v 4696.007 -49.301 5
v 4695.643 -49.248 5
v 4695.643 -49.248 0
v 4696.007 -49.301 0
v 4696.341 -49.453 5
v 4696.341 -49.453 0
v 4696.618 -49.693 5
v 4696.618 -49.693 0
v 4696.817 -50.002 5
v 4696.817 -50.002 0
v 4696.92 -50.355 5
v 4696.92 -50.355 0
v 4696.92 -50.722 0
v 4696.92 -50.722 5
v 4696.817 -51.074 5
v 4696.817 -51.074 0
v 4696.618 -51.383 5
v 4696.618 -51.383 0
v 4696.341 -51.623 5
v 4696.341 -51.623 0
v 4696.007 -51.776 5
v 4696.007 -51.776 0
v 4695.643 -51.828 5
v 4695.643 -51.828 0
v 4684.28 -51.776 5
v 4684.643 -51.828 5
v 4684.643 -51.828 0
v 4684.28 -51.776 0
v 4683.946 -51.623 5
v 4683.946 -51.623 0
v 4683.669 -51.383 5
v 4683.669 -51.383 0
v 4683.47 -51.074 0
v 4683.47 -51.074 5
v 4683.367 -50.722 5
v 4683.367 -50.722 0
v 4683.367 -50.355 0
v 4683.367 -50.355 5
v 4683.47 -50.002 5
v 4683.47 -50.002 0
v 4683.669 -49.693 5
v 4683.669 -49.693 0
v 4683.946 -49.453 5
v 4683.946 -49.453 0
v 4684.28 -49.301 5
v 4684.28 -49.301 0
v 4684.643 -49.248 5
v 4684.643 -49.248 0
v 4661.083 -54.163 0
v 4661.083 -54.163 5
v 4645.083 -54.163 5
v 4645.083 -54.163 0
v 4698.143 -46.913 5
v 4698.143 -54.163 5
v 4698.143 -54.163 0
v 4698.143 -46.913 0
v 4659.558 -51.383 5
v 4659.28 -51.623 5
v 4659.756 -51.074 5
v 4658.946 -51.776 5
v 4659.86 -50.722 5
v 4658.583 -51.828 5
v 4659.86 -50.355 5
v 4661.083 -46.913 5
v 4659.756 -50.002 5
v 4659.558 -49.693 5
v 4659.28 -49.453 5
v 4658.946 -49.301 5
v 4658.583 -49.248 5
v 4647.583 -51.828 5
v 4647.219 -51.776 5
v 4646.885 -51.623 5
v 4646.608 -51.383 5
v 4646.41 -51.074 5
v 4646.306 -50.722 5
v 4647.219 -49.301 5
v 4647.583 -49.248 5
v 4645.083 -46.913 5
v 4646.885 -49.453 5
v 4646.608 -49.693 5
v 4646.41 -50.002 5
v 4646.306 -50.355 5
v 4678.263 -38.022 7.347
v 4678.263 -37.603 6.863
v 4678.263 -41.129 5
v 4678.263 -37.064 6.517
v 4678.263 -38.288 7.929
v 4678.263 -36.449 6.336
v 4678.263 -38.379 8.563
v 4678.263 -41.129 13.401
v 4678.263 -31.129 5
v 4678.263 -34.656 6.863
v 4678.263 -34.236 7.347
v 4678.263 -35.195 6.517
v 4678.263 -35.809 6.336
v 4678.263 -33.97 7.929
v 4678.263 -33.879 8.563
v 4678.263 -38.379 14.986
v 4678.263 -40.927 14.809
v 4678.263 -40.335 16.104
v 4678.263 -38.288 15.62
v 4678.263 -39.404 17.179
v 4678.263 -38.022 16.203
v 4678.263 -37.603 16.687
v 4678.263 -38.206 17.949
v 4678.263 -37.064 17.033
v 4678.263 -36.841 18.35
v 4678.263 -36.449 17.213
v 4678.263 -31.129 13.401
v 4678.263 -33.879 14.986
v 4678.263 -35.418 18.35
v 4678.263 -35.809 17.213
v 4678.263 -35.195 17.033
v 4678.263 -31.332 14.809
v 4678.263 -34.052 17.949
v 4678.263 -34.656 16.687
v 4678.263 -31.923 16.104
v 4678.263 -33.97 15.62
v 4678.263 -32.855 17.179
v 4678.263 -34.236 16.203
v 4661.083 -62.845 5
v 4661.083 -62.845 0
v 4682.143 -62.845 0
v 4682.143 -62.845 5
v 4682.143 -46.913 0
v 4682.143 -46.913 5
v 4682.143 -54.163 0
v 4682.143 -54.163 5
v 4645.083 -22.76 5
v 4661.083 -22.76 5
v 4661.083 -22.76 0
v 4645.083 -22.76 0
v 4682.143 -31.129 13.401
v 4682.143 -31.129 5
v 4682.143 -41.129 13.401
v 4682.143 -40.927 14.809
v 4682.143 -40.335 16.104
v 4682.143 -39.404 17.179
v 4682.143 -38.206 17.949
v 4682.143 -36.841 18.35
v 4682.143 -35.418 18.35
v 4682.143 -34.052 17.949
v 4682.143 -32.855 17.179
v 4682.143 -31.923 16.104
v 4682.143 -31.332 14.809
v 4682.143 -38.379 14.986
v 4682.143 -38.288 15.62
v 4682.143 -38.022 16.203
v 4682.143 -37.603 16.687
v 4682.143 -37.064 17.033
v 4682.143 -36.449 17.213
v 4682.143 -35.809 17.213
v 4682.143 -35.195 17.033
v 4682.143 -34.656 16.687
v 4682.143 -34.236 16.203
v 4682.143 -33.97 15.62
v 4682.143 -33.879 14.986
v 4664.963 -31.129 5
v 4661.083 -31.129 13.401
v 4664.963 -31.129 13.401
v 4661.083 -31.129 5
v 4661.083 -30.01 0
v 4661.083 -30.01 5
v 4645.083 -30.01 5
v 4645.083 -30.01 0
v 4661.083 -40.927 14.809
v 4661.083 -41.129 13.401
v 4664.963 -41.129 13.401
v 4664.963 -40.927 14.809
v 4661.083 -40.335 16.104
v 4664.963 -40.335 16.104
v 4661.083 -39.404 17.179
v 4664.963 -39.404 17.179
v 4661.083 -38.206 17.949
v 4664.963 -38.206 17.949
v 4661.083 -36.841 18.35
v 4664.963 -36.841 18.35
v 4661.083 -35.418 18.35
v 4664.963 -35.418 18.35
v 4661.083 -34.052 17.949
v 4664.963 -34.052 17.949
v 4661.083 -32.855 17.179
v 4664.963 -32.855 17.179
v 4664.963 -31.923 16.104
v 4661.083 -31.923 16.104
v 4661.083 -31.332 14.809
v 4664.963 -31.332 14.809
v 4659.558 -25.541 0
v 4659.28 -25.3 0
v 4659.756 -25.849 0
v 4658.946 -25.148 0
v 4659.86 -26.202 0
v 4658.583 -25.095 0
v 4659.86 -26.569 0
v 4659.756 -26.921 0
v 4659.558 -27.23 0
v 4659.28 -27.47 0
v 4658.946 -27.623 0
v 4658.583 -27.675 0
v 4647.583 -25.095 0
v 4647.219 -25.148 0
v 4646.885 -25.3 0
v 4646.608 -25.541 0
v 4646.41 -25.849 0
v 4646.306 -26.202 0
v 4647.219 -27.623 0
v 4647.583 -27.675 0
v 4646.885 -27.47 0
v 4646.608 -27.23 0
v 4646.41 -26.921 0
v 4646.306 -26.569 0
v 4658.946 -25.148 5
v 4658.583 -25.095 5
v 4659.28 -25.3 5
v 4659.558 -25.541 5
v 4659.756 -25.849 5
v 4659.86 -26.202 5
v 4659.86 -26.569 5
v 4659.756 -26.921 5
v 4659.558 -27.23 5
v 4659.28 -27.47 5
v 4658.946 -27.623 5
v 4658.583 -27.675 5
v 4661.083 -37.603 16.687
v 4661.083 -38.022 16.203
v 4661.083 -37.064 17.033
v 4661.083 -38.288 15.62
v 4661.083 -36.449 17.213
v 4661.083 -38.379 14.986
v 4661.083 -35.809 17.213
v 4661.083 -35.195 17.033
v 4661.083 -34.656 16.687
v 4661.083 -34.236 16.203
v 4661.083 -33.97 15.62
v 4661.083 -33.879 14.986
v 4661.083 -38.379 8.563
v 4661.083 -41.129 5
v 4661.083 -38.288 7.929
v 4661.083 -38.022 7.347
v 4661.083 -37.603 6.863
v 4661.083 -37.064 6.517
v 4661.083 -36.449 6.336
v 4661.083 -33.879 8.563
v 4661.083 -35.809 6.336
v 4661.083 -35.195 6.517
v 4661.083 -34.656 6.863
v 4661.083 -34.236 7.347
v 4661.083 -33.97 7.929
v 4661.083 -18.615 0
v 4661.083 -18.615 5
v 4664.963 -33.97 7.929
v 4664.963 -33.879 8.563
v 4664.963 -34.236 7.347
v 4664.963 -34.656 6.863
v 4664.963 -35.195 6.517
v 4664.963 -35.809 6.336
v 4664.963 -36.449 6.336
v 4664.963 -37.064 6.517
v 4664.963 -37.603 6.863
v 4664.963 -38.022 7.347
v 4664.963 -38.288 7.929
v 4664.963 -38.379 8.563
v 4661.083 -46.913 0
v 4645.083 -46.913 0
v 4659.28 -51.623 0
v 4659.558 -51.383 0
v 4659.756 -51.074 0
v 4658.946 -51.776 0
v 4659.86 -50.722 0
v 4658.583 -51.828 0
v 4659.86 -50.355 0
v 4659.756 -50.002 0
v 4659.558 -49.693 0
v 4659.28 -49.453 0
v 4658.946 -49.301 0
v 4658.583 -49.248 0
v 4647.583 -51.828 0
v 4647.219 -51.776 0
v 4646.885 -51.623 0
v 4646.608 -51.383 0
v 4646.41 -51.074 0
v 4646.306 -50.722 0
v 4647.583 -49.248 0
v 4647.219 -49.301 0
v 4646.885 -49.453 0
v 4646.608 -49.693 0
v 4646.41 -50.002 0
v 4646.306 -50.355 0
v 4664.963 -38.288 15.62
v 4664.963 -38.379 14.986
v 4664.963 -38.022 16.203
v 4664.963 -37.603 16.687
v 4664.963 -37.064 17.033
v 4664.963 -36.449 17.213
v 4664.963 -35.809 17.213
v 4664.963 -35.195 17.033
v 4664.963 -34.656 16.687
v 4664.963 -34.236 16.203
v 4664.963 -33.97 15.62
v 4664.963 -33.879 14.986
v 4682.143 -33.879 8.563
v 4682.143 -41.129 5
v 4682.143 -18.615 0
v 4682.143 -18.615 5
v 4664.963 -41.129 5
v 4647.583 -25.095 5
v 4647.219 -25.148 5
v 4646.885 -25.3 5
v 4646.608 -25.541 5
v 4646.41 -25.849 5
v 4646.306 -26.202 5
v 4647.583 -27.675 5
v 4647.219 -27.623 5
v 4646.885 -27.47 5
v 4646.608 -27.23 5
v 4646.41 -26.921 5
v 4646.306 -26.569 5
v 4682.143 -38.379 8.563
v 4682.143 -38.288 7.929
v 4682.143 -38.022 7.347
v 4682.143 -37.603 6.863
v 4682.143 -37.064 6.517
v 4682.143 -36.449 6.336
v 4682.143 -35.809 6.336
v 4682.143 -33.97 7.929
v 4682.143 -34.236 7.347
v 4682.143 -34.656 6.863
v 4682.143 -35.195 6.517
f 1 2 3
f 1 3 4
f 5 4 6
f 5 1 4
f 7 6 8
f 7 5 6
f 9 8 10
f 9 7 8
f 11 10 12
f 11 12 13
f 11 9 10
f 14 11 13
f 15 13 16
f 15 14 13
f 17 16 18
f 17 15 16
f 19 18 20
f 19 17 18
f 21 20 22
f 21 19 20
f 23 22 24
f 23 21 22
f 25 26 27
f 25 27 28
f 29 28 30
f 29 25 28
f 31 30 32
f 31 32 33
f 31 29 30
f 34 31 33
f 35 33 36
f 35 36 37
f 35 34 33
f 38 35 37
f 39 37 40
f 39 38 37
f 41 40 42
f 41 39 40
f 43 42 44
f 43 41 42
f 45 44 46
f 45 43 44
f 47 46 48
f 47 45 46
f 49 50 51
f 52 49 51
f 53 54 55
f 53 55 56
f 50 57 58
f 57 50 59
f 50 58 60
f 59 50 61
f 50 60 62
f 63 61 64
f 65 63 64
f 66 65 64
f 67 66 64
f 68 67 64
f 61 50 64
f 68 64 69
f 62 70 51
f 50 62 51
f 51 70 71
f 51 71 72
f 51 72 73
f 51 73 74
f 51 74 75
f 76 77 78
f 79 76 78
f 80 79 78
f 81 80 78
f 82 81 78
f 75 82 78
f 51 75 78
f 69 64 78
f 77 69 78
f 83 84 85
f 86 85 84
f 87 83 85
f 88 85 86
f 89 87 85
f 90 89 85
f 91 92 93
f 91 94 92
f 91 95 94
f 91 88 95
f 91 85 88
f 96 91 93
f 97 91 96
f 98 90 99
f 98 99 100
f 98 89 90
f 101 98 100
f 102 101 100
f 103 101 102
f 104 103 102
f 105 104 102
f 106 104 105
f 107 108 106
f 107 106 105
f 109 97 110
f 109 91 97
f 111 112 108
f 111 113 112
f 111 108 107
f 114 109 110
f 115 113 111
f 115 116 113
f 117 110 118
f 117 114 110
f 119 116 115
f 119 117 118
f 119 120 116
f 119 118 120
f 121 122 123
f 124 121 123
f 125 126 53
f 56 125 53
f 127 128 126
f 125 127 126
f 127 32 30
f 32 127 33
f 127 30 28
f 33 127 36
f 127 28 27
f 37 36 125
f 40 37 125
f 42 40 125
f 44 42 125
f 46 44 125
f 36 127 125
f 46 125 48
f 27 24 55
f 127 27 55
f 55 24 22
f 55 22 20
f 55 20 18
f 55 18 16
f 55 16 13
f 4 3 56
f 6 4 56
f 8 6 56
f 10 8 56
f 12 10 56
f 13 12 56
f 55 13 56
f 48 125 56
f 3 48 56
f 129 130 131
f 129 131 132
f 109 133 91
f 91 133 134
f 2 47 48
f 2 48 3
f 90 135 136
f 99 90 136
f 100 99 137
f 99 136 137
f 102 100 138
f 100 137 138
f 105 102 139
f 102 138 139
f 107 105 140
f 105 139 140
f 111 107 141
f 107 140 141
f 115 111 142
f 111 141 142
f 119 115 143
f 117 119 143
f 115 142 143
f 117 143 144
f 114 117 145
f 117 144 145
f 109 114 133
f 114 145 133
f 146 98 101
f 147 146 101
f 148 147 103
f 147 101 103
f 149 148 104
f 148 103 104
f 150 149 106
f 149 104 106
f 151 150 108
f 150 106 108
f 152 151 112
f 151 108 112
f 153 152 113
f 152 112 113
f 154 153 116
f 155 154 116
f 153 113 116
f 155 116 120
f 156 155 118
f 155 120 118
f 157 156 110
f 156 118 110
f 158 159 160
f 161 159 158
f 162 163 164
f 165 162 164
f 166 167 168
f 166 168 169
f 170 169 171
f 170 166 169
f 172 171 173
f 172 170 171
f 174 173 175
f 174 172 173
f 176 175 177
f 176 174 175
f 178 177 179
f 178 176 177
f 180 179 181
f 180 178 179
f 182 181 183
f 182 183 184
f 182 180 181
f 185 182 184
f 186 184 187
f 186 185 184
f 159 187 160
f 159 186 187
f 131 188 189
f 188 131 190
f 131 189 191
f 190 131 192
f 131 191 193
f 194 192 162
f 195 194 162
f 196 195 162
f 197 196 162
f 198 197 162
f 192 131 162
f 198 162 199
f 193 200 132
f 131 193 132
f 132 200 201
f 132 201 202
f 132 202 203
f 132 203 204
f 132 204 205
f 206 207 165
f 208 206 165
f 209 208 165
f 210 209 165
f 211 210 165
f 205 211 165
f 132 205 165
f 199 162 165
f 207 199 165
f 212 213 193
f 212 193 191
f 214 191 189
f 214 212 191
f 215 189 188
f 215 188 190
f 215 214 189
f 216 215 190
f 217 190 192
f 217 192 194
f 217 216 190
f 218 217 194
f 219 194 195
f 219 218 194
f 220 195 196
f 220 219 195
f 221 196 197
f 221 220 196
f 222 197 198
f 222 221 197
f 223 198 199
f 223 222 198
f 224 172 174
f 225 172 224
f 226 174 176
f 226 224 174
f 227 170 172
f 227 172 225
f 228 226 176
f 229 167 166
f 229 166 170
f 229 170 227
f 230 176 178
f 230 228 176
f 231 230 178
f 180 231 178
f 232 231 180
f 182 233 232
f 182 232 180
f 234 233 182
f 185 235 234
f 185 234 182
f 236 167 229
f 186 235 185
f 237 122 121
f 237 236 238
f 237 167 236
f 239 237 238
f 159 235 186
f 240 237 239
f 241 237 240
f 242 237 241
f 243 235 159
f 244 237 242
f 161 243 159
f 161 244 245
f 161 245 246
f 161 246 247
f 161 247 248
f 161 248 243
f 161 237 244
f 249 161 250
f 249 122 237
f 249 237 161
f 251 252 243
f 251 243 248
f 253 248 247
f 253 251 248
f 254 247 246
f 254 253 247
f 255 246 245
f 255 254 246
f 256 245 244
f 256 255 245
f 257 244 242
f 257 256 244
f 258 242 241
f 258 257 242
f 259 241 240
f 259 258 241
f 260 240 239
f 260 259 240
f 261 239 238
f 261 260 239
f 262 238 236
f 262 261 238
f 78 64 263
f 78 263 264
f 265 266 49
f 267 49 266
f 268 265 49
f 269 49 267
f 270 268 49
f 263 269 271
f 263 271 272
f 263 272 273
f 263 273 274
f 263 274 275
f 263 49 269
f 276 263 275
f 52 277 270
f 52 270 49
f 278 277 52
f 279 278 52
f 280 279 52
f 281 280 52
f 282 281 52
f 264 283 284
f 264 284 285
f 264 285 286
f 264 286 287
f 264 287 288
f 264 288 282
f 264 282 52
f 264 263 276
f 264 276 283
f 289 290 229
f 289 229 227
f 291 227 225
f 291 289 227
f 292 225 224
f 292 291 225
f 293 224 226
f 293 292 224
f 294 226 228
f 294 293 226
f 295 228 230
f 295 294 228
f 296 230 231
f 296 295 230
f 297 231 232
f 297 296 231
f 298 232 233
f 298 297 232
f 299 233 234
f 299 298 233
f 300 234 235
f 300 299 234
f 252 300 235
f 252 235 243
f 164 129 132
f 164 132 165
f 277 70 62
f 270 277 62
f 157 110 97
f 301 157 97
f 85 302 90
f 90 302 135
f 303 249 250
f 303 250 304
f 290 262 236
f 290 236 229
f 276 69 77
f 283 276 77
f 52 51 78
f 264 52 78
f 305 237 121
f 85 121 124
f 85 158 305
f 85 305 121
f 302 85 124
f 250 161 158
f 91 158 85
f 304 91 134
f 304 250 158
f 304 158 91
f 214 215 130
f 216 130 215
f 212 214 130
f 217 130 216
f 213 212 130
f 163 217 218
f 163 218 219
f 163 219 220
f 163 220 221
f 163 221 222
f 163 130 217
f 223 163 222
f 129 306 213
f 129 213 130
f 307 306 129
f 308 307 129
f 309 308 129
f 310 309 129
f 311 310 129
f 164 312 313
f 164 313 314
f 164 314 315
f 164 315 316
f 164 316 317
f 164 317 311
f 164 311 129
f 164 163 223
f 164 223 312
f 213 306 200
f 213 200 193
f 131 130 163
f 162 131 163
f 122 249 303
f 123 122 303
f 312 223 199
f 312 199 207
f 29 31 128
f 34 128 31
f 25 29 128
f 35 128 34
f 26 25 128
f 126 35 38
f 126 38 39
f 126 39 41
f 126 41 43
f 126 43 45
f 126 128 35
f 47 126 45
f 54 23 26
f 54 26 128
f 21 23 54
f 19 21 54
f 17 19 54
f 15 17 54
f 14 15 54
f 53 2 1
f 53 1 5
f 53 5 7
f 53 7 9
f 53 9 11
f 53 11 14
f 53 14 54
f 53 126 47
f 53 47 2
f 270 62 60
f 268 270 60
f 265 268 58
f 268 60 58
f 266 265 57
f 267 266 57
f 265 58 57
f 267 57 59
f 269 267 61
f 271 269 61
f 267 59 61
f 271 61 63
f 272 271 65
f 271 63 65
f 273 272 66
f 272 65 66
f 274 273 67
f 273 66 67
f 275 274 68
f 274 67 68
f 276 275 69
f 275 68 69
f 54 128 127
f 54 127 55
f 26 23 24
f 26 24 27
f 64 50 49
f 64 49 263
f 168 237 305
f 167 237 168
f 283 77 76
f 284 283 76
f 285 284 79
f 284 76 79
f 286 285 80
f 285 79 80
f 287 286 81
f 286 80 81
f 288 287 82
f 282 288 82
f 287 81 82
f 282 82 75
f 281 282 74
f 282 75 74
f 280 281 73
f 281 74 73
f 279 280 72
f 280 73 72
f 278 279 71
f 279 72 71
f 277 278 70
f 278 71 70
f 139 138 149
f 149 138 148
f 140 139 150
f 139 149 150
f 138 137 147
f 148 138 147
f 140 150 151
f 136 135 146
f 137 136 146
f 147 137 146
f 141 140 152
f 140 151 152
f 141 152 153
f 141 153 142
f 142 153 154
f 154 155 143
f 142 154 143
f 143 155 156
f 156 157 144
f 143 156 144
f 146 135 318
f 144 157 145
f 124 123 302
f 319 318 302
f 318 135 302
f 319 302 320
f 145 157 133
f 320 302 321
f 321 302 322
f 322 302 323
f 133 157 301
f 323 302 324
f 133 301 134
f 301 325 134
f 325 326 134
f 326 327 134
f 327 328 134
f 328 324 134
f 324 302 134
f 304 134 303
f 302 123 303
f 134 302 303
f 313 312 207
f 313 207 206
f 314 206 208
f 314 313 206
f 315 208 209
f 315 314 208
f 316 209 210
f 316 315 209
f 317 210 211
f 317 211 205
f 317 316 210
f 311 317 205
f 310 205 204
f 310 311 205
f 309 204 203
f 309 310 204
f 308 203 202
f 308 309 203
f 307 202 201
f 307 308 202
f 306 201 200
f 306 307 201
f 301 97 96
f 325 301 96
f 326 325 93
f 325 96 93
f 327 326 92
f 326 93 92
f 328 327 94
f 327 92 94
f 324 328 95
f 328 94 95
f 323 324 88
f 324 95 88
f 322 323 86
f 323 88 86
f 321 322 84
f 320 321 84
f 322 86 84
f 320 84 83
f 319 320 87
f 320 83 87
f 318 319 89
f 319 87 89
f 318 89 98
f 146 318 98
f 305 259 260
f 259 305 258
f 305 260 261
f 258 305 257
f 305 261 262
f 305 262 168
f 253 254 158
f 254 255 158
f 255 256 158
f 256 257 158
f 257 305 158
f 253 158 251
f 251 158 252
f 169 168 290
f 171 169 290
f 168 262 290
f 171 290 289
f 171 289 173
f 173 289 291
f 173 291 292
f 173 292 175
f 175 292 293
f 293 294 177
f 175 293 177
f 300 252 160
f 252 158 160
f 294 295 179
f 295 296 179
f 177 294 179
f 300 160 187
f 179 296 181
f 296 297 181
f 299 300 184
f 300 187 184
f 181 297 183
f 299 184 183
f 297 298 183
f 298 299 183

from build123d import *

# Parameters (mm, degrees)
SKETCH1_W           = 21.060518524
SKETCH1_H           = 44.229680595
BOSS_EXTRUDE1_DEPTH = 5
BOSS_EXTRUDE3_DEPTH = 3.8801
CUT_EXTRUDE1_DEPTH  = 8
SKETCH6_W           = 16
SKETCH6_H           = 7.25
BOSS_EXTRUDE4_DEPTH = 5
SKETCH11_W          = 16
SKETCH11_H          = 7.25
CUT_EXTRUDE2_DEPTH  = 5


with BuildPart() as part:
    # Sketch1 → Boss-Extrude1 (new body)
    with BuildSketch(Plane.XY):
        with Locations((4671.613089989, -40.729662913)):
            Rectangle(SKETCH1_W, SKETCH1_H)
    extrude(amount=BOSS_EXTRUDE1_DEPTH)

    # Sketch4 → Boss-Extrude3 (add)
    with BuildSketch(Plane.ZY.offset(-4661.082830727)):
        with BuildLine():
            Line((13.400549781, -31.129223835), (5, -31.129223835))
            Line((5, -31.129223835), (5, -41.129223835))
            Line((5, -41.129223835), (13.400549781, -41.129223835))
            ThreePointArc((13.400549781, -41.129223835), (18.400549781, -36.129223835), (13.400549781, -31.129223835))
        make_face()
    boss_extrude3 = extrude(amount=-BOSS_EXTRUDE3_DEPTH)

    # Sketch5 → Cut-Extrude1 (cut)
    with BuildSketch(Plane(origin=(4664.962930727, 0, 0), x_dir=(0, 0, -1), z_dir=(1, 0, 0))):
        with BuildLine():
            Line((-14.986353963, -33.879223835), (-8.563353453, -33.879223835))
            ThreePointArc((-8.563353453, -33.879223835), (-6.313353453, -36.129223835), (-8.563353453, -38.379223835))
            Line((-8.563353453, -38.379223835), (-14.986353963, -38.379223835))
            ThreePointArc((-14.986353963, -38.379223835), (-17.236353963, -36.129223835), (-14.986353963, -33.879223835))
        make_face()
    cut_extrude1 = extrude(amount=-CUT_EXTRUDE1_DEPTH, mode=Mode.SUBTRACT)

    # Mirror2: Boss-Extrude3, Cut-Extrude1 across plane
    add(boss_extrude3.mirror(Plane.ZY.offset(-4671.613089989)))
    add(cut_extrude1.mirror(Plane.ZY.offset(-4671.613089989)), mode=Mode.SUBTRACT)


with BuildPart() as body_2:
    # Sketch6 → Boss-Extrude4 (new body)
    with BuildSketch(Plane.XY.offset(5)):
        with Locations((4690.143349251, -50.538110101)):
            Rectangle(SKETCH6_W, SKETCH6_H)
        with BuildLine():
            Line((4695.643349251, -51.827953851), (4684.643349251, -51.827953851))
            ThreePointArc((4684.643349251, -51.827953851), (4683.353505501, -50.538110101), (4684.643349251, -49.248266351))
            Line((4684.643349251, -49.248266351), (4695.643349251, -49.248266351))
            ThreePointArc((4695.643349251, -49.248266351), (4696.933193001, -50.538110101), (4695.643349251, -51.827953851))
        make_face(mode=Mode.SUBTRACT)
    extrude(amount=-BOSS_EXTRUDE4_DEPTH)


with BuildPart() as body_3:
    # Mirror3: mirrored copy
    add(body_2.part.mirror(Plane.ZY.offset(-4671.613089989)))


with BuildPart() as body_4:
    # Mirror4: mirrored copy
    add(body_3.part.mirror(Plane(origin=(0, -38.461673776, 0), x_dir=(0, 0, 1), z_dir=(0, -1, 0))))


with BuildPart() as body_5:
    # Mirror4 2: mirrored copy
    add(body_2.part.mirror(Plane(origin=(0, -38.461673776, 0), x_dir=(0, 0, 1), z_dir=(0, -1, 0))))

    # Sketch11 → Cut-Extrude2 (cut)
    with BuildSketch(Plane.XY.offset(5)):
        with Locations((4690.143349251, -26.385237452)):
            Rectangle(SKETCH11_W, SKETCH11_H)
    extrude(amount=-CUT_EXTRUDE2_DEPTH, mode=Mode.SUBTRACT)


solid = Compound([part.part, body_2.part, body_3.part, body_4.part])
